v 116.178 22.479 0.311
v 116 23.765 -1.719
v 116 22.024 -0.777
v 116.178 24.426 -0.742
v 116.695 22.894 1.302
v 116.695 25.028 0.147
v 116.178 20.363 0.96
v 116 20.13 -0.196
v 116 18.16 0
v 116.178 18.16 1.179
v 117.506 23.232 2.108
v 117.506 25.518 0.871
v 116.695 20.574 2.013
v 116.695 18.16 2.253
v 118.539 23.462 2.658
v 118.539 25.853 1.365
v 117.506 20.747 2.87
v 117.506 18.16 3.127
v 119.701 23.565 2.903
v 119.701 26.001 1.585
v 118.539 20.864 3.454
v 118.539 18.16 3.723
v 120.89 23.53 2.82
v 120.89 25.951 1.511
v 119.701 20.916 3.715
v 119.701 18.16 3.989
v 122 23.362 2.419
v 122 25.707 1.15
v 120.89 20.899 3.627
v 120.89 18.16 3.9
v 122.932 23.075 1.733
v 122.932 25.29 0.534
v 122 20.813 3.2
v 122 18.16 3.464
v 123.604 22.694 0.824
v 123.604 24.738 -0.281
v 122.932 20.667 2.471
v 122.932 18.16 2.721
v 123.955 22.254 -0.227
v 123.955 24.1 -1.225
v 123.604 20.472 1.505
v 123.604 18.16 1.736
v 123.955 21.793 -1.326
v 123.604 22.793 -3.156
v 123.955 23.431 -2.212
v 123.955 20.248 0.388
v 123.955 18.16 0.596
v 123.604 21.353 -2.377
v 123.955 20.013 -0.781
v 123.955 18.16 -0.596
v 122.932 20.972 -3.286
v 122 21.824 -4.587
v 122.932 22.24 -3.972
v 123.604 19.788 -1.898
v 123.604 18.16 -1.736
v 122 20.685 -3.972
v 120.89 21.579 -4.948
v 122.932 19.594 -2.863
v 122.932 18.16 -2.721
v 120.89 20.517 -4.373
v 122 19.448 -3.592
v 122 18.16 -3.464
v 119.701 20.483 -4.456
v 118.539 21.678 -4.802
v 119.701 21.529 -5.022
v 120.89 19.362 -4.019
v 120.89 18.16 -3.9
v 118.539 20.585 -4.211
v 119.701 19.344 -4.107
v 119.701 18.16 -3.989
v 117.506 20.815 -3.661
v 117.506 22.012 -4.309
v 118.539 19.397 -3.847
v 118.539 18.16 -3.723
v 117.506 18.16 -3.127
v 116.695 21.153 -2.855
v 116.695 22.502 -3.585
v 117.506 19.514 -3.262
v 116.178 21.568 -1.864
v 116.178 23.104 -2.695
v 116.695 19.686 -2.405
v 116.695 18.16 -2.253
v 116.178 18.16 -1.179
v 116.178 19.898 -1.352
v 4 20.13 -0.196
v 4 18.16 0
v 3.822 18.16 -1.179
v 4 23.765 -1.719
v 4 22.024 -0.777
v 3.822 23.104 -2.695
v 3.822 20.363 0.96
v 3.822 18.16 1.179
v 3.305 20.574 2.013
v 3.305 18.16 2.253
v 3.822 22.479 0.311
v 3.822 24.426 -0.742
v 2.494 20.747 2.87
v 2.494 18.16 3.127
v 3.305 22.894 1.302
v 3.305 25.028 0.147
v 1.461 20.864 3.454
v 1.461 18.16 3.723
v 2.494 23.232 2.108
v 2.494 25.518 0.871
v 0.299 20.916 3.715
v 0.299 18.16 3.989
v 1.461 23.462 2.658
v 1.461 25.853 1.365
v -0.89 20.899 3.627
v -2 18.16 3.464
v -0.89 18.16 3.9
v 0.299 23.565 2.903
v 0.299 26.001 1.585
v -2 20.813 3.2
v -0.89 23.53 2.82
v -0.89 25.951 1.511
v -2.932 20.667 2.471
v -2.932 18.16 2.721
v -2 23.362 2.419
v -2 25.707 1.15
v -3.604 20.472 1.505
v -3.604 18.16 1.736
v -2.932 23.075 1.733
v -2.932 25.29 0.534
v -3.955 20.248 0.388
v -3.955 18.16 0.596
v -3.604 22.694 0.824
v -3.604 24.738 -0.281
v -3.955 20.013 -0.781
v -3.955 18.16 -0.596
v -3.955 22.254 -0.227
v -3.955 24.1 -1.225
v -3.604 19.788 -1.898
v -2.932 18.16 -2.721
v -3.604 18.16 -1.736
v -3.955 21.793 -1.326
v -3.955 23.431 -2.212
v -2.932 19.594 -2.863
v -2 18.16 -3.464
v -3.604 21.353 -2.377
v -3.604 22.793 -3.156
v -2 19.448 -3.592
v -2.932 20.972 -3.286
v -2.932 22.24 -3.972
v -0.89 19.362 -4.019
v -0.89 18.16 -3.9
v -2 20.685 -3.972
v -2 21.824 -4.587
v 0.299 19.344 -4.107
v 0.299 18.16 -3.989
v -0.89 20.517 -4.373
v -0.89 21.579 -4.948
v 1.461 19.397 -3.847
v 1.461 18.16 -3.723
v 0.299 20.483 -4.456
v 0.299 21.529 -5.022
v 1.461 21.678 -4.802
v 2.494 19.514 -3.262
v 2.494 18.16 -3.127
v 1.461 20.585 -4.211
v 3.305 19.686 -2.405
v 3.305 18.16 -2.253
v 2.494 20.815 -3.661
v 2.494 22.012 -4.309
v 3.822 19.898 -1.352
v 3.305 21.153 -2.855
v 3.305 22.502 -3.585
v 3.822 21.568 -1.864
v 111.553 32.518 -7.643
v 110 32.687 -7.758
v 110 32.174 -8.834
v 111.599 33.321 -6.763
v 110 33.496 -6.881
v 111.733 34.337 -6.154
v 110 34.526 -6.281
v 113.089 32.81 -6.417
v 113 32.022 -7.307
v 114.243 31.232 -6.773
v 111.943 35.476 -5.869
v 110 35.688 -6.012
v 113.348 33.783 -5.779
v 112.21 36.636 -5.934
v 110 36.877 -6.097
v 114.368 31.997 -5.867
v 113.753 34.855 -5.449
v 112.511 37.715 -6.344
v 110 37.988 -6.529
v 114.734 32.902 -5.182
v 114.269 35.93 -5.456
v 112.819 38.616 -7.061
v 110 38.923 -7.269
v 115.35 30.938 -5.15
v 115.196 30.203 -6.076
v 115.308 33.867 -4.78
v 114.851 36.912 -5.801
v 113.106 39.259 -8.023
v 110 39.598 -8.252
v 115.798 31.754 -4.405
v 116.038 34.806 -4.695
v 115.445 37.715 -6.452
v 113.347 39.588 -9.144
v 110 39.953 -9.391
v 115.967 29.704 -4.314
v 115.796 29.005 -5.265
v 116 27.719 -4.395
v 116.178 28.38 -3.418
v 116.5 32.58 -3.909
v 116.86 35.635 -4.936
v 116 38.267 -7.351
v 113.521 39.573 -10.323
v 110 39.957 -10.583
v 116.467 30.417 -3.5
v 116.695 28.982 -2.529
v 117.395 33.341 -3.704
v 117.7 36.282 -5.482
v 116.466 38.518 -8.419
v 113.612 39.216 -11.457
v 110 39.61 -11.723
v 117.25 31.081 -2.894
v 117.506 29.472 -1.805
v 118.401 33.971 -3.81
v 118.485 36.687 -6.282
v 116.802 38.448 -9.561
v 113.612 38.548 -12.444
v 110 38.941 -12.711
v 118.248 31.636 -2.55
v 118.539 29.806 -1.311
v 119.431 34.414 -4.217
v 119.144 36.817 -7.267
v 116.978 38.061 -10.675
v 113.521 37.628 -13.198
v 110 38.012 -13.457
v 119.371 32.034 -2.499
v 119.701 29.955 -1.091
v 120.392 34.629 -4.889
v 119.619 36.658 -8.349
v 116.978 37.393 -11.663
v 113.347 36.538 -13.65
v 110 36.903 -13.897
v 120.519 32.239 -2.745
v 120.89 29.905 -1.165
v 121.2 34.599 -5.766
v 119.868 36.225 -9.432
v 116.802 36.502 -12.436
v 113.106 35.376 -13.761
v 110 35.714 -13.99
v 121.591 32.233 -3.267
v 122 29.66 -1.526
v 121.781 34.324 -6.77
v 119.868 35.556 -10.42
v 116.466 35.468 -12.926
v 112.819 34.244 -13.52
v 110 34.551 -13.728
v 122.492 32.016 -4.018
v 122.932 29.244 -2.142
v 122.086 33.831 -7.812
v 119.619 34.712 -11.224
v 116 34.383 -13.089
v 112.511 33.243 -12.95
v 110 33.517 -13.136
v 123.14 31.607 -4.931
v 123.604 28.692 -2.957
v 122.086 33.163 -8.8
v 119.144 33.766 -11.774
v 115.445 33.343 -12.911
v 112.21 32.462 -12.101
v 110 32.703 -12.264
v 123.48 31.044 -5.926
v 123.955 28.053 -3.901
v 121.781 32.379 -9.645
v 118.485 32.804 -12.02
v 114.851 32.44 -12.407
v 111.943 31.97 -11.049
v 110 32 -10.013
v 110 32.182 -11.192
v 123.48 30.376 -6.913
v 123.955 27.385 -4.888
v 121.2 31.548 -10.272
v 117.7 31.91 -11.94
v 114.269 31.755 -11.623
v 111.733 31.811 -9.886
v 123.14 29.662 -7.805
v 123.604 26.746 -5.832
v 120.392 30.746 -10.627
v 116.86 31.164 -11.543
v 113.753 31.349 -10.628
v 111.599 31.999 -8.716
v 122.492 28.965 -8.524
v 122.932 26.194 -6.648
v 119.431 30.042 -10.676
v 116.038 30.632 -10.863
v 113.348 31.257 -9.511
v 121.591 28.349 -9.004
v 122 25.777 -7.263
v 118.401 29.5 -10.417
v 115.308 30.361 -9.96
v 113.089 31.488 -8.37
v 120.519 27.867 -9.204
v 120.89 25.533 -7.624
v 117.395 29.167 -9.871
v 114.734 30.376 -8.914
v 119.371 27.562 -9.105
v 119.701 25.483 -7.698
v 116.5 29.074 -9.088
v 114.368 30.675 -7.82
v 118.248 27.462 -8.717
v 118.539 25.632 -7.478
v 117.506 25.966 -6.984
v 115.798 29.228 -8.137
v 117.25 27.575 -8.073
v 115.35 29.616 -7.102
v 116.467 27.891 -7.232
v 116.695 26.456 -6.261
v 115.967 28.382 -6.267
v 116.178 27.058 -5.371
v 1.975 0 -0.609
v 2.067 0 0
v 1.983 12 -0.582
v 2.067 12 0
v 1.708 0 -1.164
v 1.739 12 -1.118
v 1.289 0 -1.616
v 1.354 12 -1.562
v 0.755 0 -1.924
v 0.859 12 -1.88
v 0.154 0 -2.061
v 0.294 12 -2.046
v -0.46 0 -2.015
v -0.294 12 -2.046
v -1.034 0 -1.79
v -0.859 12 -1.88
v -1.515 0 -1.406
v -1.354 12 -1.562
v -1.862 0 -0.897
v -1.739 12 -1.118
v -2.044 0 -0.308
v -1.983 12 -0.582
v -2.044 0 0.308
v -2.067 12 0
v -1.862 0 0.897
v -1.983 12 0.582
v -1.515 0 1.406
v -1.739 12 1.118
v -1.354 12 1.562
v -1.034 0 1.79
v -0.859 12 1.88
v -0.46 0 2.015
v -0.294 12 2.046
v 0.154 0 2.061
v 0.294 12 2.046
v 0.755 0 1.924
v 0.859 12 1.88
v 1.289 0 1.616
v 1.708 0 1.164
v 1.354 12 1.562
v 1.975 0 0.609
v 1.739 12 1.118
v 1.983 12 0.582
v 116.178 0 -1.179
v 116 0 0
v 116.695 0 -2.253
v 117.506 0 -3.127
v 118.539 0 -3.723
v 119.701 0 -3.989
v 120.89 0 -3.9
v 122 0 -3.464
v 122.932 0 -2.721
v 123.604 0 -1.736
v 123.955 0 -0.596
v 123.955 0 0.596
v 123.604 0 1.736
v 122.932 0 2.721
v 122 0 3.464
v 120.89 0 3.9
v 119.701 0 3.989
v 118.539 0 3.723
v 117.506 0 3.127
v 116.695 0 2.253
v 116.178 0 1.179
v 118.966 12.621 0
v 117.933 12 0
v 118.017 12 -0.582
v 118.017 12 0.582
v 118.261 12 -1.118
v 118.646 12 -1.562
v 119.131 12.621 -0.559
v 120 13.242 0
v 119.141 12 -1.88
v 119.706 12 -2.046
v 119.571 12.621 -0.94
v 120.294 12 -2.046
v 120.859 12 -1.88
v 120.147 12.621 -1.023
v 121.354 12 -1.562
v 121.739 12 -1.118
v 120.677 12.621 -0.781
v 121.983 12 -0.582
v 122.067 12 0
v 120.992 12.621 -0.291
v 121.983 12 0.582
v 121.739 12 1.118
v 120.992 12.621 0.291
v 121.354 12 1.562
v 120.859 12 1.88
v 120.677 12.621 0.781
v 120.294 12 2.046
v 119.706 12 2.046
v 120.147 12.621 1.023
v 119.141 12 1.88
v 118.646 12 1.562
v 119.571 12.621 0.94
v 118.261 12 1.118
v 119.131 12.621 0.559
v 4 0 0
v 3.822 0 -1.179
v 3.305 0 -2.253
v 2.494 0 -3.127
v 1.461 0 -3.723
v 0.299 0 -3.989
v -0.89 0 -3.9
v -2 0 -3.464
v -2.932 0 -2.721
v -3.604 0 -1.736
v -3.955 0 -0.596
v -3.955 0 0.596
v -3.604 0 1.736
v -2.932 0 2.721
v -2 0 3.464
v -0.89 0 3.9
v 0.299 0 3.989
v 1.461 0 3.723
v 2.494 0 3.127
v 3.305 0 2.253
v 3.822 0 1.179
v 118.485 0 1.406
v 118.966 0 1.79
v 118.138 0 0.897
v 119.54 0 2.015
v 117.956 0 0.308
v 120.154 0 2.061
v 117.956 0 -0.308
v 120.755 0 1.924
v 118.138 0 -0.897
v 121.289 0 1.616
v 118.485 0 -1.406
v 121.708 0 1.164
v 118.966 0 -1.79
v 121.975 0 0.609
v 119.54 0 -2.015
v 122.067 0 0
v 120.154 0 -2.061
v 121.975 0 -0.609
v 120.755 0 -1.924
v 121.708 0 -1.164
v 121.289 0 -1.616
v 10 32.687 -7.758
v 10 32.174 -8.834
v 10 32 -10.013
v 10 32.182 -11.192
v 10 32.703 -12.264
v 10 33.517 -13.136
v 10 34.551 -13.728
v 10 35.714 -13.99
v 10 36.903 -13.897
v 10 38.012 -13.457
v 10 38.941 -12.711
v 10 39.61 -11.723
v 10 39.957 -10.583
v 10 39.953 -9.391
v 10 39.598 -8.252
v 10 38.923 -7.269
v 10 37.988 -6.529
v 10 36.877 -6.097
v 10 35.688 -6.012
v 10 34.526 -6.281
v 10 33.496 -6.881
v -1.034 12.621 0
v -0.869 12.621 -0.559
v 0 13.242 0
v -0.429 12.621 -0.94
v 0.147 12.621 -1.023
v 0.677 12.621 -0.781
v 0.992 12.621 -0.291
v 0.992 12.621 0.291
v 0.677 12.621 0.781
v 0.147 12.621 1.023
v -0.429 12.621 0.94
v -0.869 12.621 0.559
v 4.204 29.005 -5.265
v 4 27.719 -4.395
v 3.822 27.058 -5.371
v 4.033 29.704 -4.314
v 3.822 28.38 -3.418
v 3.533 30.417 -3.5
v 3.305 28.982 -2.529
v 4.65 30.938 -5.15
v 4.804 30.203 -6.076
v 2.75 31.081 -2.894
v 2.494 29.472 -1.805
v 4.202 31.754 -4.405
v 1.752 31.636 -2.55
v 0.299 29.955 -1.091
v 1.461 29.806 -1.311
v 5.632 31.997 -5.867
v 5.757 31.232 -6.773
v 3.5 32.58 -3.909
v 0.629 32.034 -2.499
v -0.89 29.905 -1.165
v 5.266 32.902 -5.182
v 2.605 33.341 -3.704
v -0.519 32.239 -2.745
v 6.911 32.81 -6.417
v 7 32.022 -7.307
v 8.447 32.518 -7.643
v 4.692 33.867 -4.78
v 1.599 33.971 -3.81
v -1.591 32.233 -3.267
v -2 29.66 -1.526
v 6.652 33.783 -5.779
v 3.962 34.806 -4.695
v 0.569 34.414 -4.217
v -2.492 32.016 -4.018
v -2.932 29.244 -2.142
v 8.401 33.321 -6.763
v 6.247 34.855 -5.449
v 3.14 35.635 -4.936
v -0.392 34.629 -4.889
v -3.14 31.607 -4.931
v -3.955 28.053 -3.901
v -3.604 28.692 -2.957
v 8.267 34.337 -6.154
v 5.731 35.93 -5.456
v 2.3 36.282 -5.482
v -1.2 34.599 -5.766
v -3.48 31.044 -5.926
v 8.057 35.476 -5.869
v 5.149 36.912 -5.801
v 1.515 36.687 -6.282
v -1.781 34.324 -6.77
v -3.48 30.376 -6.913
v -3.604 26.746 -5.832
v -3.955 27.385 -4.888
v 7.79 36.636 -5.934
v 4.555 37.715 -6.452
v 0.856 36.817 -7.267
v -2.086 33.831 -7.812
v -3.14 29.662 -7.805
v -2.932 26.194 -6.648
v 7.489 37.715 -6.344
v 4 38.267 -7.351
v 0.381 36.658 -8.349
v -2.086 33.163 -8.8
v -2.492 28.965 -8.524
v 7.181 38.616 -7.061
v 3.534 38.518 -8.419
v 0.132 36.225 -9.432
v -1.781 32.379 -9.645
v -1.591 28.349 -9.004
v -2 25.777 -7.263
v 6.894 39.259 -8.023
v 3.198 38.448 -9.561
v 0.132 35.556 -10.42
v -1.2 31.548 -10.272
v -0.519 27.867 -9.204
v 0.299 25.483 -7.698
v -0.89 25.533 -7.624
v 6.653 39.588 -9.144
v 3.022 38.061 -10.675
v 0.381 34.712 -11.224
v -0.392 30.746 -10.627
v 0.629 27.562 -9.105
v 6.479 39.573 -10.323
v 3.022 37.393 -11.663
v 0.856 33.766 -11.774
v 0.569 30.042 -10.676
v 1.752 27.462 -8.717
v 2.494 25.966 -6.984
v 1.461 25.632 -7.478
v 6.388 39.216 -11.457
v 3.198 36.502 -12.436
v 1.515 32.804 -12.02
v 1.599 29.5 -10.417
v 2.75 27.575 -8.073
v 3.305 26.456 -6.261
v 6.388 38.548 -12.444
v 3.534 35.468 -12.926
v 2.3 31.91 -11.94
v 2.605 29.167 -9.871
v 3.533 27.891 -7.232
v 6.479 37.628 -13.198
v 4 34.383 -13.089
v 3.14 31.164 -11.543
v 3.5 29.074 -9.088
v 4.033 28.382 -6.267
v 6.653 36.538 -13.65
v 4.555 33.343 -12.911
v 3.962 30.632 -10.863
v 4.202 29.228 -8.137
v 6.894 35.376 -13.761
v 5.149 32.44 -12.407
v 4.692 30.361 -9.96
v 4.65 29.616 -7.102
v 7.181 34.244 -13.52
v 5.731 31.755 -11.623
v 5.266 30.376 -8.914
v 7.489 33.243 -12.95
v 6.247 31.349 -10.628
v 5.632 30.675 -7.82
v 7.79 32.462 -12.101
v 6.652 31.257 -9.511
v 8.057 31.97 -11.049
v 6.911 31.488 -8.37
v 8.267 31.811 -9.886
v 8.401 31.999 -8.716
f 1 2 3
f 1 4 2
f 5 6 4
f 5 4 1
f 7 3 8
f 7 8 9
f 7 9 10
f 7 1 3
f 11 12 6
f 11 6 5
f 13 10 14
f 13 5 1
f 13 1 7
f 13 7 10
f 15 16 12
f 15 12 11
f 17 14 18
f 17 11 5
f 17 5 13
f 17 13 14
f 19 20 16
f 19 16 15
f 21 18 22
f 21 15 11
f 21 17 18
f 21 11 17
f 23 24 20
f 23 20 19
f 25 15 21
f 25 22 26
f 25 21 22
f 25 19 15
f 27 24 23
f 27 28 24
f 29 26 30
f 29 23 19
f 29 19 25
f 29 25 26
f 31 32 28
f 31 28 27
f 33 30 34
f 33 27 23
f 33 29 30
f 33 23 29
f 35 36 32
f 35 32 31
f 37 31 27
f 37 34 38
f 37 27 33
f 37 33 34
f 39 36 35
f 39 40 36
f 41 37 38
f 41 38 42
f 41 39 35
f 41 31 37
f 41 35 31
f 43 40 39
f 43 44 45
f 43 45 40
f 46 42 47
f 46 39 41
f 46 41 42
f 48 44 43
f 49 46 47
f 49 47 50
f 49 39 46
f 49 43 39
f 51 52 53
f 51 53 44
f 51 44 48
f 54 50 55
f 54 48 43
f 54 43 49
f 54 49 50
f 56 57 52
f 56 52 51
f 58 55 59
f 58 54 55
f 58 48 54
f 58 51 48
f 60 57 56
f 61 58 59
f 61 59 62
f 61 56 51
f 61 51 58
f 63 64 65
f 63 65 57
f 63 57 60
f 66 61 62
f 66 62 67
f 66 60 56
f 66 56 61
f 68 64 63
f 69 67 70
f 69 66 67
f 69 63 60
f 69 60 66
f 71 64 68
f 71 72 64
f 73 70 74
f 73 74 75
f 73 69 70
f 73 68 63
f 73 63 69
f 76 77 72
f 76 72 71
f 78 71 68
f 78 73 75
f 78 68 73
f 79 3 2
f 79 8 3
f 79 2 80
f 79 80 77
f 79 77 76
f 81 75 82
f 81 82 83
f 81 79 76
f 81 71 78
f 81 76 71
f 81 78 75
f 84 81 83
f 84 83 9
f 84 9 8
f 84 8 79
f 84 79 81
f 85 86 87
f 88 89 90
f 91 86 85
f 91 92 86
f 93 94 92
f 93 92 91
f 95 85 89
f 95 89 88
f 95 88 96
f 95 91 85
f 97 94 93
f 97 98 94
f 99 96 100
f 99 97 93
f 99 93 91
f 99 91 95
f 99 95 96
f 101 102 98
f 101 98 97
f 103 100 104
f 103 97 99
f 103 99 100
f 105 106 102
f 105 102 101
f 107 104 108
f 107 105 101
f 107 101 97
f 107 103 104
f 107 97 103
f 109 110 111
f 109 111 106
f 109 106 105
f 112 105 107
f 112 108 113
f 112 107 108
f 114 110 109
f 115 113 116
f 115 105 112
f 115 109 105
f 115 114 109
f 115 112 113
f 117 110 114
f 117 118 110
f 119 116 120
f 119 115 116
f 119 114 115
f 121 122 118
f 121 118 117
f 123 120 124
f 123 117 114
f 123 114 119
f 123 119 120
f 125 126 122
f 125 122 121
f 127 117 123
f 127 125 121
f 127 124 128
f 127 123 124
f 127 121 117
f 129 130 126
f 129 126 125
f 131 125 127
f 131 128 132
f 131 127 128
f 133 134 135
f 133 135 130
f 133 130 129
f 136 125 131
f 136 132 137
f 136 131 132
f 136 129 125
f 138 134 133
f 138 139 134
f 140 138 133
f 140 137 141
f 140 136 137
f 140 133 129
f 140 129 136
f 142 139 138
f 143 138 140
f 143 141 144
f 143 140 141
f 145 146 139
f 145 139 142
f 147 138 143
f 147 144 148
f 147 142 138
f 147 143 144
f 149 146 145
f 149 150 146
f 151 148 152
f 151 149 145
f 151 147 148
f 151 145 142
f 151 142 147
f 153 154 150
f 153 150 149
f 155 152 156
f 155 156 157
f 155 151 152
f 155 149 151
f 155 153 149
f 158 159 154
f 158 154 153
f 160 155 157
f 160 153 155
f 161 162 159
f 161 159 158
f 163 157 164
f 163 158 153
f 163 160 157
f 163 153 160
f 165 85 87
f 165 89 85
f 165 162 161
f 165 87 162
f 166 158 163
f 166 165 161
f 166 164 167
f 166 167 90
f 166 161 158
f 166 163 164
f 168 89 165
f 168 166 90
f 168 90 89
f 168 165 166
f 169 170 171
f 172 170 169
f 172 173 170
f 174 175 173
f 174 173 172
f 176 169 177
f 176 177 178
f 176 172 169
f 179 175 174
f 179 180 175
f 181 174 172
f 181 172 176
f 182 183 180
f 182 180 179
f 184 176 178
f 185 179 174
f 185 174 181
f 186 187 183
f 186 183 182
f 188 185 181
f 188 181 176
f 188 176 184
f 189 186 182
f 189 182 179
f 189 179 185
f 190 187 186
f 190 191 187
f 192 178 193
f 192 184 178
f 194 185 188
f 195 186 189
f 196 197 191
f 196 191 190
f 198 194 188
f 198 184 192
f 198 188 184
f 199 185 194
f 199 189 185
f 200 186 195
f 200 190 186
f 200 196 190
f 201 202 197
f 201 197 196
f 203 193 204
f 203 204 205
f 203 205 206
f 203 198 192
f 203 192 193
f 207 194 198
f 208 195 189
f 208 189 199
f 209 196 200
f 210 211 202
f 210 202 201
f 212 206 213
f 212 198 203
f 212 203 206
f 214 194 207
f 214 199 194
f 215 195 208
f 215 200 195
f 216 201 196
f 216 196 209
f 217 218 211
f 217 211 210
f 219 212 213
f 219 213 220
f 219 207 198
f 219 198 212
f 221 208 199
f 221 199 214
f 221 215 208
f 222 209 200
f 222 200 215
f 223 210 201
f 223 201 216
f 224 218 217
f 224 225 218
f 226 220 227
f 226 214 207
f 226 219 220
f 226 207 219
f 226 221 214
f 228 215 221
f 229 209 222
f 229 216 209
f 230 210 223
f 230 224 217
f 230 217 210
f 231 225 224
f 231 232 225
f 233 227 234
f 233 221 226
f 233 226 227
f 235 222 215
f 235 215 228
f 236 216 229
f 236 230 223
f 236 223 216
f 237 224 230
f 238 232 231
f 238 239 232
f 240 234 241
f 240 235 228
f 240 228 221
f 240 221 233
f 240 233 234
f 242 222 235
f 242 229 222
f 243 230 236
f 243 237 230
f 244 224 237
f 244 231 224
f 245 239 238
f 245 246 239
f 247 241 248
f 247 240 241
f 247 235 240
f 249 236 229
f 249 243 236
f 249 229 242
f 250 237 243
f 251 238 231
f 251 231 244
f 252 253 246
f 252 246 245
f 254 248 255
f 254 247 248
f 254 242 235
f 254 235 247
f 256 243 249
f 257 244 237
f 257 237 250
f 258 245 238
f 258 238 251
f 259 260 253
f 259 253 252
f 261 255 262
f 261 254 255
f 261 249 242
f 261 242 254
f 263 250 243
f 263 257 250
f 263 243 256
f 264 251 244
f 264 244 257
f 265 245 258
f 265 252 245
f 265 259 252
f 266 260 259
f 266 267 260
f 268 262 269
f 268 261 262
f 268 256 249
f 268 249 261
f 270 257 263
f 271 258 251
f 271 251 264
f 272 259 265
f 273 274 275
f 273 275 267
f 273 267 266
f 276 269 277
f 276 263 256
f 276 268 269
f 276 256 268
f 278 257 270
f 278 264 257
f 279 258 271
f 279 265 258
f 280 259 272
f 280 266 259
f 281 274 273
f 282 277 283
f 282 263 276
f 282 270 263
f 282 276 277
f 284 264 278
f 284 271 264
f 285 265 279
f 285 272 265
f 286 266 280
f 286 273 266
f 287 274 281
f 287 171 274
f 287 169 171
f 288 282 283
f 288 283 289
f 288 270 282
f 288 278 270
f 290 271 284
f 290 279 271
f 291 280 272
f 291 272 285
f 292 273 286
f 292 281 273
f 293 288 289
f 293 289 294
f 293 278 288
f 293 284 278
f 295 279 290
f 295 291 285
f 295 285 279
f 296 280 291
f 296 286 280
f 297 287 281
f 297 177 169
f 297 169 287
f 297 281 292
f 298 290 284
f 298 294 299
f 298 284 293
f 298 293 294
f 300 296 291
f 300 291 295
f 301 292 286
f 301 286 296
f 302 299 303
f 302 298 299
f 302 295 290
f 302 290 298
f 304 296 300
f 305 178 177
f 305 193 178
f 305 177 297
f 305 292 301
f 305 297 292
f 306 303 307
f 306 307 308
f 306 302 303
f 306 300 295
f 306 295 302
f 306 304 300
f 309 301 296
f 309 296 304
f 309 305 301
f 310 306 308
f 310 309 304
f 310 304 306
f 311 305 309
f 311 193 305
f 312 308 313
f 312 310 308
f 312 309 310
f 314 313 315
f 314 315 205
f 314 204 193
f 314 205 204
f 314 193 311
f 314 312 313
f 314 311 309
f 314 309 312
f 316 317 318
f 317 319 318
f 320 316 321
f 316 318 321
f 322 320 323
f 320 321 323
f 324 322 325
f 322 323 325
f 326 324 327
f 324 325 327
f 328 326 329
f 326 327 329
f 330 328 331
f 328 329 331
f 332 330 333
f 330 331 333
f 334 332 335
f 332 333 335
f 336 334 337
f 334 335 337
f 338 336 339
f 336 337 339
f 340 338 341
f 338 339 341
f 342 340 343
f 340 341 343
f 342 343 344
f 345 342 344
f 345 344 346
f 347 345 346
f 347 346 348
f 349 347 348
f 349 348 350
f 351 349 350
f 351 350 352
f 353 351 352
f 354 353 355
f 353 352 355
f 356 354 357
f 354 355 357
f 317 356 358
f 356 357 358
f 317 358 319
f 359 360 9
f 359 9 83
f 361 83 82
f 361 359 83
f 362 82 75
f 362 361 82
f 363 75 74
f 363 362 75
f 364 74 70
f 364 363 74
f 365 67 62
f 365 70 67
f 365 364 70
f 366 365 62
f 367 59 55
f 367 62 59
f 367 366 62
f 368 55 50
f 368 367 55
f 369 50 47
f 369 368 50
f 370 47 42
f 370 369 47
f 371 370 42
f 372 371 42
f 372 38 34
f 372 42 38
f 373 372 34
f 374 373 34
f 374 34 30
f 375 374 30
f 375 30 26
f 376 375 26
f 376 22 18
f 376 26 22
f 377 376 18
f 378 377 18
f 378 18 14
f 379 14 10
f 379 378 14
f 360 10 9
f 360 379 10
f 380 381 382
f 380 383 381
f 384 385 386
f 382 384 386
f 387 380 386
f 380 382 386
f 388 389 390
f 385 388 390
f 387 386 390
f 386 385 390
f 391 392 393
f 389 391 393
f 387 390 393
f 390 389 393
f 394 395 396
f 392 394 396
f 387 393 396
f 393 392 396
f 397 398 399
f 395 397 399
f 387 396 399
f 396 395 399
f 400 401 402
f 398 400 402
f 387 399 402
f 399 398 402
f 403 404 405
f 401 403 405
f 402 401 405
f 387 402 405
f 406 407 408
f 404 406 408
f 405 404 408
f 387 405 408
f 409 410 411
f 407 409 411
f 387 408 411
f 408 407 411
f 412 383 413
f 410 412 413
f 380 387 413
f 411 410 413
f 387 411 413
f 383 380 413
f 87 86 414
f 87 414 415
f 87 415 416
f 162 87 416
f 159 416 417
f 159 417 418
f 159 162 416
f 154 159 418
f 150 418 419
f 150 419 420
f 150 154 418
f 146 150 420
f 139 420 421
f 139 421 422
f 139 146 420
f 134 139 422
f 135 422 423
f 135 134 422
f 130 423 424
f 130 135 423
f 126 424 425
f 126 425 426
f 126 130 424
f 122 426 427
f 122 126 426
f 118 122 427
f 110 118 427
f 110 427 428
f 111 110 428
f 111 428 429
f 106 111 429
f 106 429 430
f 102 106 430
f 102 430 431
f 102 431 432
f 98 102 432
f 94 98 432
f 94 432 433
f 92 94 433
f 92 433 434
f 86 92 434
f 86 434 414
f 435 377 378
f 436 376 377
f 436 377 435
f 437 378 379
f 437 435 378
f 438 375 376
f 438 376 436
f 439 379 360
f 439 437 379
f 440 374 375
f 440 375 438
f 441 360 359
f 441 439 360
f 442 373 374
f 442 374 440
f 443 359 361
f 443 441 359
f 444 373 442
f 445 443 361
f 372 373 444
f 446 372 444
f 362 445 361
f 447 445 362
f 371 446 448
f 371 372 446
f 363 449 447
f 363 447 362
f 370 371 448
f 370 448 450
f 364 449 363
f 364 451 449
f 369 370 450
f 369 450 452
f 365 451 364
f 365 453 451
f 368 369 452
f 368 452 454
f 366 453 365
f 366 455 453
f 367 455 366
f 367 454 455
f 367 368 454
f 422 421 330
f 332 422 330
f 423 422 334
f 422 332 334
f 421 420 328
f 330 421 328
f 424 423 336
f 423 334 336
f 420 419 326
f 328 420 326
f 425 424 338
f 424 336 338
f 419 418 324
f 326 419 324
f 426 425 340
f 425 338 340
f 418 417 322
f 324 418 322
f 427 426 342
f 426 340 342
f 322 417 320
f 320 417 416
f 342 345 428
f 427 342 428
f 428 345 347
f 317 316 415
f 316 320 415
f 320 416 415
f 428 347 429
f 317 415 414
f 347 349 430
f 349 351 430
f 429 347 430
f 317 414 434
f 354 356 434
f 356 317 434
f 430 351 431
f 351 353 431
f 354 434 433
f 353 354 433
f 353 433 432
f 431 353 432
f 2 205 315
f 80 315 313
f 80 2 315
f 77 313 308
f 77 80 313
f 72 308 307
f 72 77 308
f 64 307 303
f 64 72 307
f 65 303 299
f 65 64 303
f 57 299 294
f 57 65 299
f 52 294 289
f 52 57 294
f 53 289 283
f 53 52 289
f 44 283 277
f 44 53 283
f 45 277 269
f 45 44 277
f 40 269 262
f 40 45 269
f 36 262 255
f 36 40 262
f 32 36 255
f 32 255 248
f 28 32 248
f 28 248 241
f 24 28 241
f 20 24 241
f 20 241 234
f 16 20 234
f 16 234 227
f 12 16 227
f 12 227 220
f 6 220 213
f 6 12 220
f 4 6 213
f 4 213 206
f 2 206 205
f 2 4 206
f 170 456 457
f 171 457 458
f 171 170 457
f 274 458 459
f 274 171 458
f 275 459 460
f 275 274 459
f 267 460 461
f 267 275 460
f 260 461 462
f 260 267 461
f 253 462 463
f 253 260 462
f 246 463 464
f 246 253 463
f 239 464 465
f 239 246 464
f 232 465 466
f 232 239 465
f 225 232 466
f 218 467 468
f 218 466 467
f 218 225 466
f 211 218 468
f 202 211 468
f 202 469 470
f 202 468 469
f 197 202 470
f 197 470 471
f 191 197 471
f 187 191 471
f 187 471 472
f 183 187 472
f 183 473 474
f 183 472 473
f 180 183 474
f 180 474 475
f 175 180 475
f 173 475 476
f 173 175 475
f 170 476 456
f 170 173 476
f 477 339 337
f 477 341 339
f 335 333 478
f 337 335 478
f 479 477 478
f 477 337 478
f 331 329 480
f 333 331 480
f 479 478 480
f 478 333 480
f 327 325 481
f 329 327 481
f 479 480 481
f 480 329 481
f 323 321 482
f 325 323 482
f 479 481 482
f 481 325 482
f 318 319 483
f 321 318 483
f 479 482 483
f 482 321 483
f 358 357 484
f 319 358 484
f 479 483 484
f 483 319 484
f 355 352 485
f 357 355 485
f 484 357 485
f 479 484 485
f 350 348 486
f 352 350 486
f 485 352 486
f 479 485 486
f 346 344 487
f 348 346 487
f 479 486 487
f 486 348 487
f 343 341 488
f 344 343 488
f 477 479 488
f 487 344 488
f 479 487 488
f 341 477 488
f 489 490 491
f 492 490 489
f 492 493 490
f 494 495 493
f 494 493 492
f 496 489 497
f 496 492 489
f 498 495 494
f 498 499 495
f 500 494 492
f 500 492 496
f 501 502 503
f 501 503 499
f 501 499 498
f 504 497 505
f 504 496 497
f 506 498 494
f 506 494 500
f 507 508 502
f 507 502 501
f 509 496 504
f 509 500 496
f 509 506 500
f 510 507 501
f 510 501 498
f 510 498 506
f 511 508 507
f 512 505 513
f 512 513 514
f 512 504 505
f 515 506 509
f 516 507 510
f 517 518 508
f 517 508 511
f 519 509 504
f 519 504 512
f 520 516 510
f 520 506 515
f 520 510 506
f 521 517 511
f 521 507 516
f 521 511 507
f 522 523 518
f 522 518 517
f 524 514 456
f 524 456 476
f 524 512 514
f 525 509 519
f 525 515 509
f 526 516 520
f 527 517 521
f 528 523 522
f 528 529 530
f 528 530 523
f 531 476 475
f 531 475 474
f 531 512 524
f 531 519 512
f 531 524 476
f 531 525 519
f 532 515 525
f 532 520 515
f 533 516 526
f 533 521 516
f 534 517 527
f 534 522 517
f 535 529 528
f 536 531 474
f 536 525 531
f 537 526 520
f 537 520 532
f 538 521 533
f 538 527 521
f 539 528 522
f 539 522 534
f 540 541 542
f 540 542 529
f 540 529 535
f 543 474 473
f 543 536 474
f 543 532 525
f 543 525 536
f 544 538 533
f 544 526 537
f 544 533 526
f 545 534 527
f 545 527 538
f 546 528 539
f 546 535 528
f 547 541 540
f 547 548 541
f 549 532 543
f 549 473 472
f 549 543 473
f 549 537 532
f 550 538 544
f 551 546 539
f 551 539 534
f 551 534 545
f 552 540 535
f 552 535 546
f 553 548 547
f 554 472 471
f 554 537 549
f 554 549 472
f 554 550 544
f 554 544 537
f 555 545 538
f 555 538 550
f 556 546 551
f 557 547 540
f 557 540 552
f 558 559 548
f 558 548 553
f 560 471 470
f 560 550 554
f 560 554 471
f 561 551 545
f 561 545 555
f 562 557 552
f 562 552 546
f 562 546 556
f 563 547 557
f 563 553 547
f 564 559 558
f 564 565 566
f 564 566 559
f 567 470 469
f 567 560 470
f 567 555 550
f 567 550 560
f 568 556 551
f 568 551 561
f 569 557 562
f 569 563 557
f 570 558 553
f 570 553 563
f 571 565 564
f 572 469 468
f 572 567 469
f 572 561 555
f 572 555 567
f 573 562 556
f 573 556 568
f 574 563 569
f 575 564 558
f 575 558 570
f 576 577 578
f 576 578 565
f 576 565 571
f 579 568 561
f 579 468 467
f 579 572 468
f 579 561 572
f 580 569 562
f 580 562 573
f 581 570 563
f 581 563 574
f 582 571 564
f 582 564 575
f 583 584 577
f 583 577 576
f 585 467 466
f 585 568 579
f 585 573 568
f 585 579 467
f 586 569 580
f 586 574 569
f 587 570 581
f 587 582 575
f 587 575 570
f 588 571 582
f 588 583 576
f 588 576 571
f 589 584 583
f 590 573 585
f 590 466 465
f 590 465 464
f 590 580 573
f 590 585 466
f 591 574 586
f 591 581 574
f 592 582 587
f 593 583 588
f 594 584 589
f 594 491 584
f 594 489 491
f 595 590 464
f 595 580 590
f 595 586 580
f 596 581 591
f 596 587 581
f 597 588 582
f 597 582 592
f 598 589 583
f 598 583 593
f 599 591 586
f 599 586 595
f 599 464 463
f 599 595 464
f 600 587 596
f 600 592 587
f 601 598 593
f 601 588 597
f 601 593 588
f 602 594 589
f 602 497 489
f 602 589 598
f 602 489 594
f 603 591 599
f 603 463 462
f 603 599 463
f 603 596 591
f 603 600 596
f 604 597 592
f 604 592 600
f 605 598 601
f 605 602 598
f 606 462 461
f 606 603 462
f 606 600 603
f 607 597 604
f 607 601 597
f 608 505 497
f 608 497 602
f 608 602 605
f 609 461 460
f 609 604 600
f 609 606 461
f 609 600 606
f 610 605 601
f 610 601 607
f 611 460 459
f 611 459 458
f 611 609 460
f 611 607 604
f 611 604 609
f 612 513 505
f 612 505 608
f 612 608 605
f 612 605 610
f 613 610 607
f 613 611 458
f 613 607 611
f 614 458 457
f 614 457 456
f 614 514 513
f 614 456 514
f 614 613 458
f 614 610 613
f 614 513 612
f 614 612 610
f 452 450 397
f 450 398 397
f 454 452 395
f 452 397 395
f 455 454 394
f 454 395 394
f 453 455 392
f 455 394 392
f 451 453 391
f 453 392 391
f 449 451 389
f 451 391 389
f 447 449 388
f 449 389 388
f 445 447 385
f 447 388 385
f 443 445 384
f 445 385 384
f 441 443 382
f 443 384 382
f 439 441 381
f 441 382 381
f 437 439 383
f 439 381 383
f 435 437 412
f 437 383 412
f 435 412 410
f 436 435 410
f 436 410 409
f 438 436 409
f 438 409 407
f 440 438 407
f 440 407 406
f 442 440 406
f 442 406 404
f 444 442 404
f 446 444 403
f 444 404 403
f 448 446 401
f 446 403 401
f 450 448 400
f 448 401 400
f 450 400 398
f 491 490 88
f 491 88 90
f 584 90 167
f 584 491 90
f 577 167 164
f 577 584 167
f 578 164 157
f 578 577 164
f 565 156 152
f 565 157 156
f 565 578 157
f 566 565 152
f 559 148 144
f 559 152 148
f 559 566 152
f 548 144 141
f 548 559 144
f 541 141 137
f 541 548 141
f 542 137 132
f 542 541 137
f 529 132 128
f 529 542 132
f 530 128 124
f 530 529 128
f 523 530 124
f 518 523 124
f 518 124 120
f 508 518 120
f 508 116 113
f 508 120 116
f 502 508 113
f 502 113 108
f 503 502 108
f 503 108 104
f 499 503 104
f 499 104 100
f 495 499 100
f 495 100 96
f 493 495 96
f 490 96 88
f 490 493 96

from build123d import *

# Parameters (mm, degrees)
SKETCH2_R  = 4
TAP1_D     = 4.134
TAP1_DEPTH = 12
TAP1_TIP   = 1.2419789


with BuildPart() as part:
    # Sweep1: sweep along a curve in space
    with BuildLine() as sweep1_path:
        Line((0, 0, 0), (0, 18.16, 0))
        ThreePointArc((0, 18.16, 0), (0, 21.091478934, -0.439328933), (0, 23.765381166, -1.718713748))
        Line((0, 23.765381166, -1.718713748), (0, 27.718713748, -4.394618834))
        ThreePointArc((0, 27.718713748, -4.394618834), (2.928932188, 33.574467414, -8.358221868), (10, 36, -10))
        Line((10, 36, -10), (110, 36, -10))
        ThreePointArc((120, 27.718713748, -4.394618834), (117.071067812, 33.574467414, -8.358221868), (110, 36, -10))
        Line((120, 27.718713748, -4.394618834), (120, 23.765381166, -1.718713748))
        ThreePointArc((120, 18.16, 0), (120, 21.091478934, -0.439328933), (120, 23.765381166, -1.718713748))
        Line((120, 18.16, 0), (120, 0, 0))
    # Sketch2 → Sweep1 (sweep)
    with BuildSketch(Plane(origin=(0, 0, 0), x_dir=(1, 0, 0), z_dir=(0, 1, 0))):
        Circle(SKETCH2_R)
    sweep(path=sweep1_path.line)

    # Tap1
    with Locations(Plane(origin=(0, 0, 0), x_dir=(-1, 0, 0), z_dir=(0, -1, 0))):
        with Locations((0, 0), (-120, 0)):
            Hole(TAP1_D / 2, depth=TAP1_DEPTH)
            with Locations((0, 0, -(TAP1_DEPTH + TAP1_TIP / 2))):  # 118° drill point
                Cone(0, TAP1_D / 2, TAP1_TIP, mode=Mode.SUBTRACT)


solid = part.part
